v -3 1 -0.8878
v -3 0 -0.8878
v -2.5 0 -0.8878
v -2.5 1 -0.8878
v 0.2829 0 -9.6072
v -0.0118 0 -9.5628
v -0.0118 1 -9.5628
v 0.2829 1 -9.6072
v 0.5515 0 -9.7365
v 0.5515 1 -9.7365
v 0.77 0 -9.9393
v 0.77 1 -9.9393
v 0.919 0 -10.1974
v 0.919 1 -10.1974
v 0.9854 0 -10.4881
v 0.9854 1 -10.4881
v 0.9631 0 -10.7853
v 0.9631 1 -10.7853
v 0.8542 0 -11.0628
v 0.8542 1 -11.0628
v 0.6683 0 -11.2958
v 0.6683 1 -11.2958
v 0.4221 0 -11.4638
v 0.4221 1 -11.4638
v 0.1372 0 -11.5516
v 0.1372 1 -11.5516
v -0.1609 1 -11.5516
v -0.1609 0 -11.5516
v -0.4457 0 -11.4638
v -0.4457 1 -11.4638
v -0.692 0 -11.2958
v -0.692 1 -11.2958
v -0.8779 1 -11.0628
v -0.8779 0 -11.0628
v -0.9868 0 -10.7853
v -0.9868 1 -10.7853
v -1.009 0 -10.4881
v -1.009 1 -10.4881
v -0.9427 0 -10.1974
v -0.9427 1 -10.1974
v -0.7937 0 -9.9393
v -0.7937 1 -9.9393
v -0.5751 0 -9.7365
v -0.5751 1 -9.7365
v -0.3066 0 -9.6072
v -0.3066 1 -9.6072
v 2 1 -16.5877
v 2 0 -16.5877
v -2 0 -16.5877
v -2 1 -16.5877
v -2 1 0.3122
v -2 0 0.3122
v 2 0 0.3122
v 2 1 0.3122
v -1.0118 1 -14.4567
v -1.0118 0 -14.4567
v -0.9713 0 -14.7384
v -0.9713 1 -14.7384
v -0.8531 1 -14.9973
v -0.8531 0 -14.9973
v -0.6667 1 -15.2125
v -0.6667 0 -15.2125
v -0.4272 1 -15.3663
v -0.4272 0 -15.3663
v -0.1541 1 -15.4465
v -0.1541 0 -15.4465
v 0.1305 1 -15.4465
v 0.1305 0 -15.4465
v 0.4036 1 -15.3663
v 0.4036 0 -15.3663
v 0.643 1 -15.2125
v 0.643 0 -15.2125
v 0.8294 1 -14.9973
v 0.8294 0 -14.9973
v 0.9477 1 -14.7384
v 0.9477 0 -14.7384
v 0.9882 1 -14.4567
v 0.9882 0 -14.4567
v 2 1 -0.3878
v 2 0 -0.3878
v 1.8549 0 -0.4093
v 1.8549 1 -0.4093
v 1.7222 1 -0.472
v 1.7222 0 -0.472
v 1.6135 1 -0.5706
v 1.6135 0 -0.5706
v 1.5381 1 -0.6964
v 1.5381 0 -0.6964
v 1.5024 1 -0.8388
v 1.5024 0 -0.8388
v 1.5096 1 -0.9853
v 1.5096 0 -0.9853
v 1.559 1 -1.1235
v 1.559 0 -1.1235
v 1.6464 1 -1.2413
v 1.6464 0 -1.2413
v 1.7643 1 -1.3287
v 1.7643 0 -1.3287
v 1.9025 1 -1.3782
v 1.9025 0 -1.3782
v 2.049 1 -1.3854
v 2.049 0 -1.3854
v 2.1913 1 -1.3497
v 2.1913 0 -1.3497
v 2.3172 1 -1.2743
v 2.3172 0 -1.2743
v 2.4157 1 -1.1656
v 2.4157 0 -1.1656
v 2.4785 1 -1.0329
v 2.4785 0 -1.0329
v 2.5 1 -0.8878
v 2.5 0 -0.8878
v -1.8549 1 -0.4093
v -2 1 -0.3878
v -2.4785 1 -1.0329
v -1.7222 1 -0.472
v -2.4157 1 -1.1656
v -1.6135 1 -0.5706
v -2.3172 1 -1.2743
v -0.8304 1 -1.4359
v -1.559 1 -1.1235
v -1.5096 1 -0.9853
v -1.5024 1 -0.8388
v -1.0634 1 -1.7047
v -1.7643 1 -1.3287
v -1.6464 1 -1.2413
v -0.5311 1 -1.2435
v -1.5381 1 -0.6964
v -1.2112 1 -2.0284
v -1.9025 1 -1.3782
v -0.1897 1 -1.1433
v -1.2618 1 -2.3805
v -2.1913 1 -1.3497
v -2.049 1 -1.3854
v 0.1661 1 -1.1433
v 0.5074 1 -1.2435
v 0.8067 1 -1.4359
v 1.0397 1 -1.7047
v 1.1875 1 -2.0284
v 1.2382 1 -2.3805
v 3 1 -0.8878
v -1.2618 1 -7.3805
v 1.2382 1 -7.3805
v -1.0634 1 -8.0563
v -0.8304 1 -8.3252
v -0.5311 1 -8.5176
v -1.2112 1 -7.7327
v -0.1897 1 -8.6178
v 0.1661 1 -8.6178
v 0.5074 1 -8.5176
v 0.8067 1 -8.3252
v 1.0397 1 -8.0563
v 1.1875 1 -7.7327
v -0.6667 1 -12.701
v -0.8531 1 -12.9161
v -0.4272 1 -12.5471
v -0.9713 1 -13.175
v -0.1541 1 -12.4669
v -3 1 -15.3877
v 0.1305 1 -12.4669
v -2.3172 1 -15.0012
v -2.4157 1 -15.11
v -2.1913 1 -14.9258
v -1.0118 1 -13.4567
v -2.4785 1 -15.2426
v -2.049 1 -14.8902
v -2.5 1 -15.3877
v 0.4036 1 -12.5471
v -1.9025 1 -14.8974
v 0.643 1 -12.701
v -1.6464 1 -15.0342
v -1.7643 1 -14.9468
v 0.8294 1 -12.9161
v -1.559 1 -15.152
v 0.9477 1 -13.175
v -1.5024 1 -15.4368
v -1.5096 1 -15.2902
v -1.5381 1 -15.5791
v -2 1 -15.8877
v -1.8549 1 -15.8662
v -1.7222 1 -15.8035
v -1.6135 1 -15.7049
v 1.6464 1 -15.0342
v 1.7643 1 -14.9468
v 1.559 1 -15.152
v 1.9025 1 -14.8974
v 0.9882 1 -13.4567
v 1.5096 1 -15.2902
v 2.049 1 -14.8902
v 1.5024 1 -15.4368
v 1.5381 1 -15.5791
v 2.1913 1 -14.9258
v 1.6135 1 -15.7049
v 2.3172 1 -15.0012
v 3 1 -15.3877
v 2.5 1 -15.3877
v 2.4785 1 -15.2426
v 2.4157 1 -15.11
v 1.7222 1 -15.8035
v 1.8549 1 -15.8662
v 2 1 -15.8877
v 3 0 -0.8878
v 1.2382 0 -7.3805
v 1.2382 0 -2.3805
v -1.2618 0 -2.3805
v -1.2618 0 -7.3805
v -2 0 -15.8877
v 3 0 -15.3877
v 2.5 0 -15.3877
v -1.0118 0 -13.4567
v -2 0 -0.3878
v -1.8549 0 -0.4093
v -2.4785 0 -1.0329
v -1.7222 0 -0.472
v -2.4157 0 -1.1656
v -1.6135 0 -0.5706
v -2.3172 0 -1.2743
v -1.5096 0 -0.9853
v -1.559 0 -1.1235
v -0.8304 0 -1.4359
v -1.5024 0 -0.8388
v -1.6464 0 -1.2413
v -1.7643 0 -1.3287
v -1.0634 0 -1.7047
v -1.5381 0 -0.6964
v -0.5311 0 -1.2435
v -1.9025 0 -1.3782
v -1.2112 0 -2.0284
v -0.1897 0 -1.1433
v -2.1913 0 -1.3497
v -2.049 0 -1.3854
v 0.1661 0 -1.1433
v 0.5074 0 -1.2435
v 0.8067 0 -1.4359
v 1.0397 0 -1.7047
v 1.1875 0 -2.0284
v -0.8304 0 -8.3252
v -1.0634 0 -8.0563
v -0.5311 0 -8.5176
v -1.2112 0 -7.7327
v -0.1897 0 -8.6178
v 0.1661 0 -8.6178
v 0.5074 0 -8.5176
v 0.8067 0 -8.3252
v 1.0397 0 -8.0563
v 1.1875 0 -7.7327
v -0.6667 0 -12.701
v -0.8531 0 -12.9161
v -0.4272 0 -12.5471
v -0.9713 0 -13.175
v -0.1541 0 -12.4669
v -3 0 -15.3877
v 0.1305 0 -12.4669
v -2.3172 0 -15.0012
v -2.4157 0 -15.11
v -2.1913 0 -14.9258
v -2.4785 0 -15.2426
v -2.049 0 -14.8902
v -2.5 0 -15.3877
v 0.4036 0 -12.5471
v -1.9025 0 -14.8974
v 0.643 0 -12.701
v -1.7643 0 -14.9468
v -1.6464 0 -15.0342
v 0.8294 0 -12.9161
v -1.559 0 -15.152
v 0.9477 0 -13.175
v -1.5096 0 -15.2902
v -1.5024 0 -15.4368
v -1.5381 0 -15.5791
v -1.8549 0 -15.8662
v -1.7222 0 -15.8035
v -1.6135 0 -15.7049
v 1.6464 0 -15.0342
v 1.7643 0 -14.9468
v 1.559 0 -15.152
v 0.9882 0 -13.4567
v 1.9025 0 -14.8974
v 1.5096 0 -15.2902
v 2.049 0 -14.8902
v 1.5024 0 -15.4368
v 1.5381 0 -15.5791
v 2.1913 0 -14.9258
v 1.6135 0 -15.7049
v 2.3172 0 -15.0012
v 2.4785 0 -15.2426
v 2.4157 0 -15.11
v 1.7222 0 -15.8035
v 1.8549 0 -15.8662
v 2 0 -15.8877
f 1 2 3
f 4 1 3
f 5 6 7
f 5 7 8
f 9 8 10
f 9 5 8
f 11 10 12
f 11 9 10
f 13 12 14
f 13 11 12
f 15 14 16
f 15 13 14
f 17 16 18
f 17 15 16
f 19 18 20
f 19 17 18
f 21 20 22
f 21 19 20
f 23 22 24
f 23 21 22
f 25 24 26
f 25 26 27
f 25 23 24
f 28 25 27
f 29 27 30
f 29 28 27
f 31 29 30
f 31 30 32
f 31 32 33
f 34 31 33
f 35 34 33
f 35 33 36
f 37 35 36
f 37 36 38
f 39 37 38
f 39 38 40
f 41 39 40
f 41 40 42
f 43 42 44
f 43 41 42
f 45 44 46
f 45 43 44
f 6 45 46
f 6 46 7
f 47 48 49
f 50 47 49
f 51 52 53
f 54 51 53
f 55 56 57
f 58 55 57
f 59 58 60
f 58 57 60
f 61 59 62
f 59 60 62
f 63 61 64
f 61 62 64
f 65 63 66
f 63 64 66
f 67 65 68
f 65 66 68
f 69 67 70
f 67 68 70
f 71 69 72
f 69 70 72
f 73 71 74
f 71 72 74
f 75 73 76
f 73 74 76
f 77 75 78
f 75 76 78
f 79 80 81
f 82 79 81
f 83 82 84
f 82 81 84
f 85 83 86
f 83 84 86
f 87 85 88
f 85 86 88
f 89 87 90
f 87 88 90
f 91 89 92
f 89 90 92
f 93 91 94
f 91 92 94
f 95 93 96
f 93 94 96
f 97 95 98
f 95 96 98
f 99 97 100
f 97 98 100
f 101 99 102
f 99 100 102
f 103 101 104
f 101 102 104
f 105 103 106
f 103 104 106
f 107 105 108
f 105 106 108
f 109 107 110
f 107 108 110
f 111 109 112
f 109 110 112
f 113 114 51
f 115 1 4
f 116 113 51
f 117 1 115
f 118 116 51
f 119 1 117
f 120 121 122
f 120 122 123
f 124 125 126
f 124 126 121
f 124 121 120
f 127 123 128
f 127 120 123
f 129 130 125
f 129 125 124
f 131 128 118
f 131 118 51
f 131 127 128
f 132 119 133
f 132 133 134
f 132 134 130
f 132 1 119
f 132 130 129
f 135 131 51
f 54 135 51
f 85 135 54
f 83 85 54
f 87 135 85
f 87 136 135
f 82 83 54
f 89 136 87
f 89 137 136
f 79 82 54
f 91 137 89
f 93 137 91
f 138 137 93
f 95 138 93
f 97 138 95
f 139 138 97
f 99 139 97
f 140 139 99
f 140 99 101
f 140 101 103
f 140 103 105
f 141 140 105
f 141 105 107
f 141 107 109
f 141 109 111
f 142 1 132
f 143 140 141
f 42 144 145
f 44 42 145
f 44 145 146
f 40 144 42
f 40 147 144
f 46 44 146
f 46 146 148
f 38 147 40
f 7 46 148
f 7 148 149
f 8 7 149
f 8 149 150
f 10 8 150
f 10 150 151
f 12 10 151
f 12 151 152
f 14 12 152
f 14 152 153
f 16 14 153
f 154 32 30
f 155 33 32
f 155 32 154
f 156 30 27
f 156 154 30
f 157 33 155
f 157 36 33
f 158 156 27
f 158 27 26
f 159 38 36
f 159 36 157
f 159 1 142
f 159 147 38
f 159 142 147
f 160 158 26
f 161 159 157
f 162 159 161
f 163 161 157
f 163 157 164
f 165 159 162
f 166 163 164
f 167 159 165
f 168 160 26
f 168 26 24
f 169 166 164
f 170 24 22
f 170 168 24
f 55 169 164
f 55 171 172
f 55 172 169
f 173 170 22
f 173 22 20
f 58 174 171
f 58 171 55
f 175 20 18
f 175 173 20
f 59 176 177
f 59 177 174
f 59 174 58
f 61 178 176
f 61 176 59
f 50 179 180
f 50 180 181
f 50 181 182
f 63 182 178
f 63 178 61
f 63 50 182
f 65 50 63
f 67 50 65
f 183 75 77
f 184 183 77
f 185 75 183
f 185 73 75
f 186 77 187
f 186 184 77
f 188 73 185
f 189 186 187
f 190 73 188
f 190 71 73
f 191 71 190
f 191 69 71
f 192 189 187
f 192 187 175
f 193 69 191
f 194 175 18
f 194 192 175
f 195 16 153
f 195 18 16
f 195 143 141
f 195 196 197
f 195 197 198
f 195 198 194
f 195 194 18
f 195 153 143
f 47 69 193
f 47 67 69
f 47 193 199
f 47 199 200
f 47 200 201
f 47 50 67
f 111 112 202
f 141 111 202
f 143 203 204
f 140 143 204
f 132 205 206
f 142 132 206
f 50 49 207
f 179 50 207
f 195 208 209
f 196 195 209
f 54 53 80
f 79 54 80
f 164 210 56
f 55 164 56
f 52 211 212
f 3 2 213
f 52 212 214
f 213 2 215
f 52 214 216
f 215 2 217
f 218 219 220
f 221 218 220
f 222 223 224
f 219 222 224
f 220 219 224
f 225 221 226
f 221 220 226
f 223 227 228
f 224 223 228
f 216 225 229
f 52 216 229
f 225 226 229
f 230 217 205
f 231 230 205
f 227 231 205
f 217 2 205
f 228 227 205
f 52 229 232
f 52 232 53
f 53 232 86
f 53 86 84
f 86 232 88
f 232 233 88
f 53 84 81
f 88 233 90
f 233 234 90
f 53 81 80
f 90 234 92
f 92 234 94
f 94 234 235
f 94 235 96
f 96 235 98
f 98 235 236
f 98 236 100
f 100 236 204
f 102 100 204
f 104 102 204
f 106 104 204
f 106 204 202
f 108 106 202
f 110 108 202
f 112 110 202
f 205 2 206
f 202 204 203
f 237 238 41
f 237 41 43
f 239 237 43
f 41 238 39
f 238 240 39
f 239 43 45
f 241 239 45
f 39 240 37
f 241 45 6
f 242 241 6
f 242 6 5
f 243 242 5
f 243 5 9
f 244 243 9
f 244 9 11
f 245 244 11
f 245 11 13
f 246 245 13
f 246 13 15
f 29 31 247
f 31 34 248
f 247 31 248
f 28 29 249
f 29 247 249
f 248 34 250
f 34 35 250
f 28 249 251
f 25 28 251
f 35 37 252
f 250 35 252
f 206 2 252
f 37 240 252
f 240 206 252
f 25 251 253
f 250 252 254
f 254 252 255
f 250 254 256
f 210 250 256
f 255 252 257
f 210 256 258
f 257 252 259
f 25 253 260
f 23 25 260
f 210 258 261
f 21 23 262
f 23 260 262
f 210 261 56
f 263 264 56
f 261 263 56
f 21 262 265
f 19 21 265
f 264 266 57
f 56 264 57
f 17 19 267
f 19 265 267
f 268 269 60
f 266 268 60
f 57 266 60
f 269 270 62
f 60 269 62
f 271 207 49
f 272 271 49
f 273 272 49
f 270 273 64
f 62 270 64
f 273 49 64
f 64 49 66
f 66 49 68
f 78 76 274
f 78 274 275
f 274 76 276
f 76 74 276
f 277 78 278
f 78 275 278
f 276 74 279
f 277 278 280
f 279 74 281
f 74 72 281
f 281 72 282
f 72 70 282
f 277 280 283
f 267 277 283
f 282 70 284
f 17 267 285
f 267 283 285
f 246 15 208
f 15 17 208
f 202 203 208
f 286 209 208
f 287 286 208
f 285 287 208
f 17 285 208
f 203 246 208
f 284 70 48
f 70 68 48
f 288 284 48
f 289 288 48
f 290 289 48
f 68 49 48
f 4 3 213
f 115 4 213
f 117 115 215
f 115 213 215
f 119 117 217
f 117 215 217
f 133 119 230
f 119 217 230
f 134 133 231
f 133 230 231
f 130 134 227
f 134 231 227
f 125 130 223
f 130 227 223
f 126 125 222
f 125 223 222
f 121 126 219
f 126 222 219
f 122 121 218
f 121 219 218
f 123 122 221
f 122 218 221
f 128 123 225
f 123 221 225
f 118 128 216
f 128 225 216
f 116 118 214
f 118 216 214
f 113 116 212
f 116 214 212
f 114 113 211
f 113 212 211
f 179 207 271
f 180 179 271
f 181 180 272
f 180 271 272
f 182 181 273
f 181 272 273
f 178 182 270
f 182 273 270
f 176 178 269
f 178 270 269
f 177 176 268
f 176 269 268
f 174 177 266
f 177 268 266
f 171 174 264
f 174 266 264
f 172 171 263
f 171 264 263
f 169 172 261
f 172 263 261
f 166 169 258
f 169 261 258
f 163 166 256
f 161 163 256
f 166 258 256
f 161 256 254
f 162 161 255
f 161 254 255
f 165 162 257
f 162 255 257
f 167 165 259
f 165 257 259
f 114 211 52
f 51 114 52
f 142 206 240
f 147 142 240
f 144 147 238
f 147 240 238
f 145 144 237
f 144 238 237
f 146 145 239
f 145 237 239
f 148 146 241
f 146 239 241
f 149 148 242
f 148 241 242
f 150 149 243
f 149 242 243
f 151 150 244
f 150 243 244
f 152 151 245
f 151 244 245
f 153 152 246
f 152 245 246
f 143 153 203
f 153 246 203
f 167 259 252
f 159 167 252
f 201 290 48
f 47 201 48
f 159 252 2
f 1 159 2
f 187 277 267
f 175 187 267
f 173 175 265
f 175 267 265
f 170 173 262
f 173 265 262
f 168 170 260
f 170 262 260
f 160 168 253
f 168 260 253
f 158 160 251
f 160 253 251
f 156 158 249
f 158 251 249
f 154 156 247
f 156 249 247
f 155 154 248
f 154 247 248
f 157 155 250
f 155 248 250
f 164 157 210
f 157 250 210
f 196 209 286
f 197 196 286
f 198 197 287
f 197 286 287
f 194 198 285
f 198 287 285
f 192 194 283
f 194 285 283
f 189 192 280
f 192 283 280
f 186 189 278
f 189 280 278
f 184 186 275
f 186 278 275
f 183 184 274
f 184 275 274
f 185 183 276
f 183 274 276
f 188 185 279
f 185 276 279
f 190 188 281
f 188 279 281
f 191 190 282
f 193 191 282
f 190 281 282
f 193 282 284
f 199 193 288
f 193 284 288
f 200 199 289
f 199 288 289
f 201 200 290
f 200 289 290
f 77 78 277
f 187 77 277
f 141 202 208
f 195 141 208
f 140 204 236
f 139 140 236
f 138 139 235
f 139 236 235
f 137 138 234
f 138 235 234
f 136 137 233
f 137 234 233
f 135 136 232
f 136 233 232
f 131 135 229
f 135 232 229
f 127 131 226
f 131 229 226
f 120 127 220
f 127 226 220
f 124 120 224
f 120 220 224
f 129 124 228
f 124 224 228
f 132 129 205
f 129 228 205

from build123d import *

# Parameters (mm, degrees)
SKETCH_1_R      = 1
EXTRUDE_1_DEPTH = 1


with BuildPart() as part:
    # 草图1 → 凸台-拉伸1 (new body)
    with BuildSketch(Plane(origin=(0, 0, 0), x_dir=(1, 0, 0), z_dir=(0, 1, 0))):
        with BuildLine():
            Line((-2, 16.38774479), (-2, 15.88774479))
            ThreePointArc((-2, 15.88774479), (-1.646446609, 15.034191399), (-2.5, 15.38774479))
            Line((-2.5, 15.38774479), (-3, 15.38774479))
            Line((-3, 15.38774479), (-3, 14.38774479))
            Line((-3, 14.38774479), (-3, 3.38774479))
            Line((-3, 3.38774479), (-3, 2.087766192))
            Line((-3, 2.087766192), (-3, 0.887766192))
            Line((-3, 0.887766192), (-2.5, 0.887766192))
            ThreePointArc((-2.5, 0.887766192), (-1.646446609, 1.241319582), (-2, 0.387766192))
            Line((-2, 0.387766192), (-2, -0.312233808))
            Line((-2, -0.312233808), (2, -0.312233808))
            Line((2, -0.312233808), (2, 0.387766192))
            ThreePointArc((2, 0.387766192), (1.646446609, 1.241319582), (2.5, 0.887766192))
            Line((2.5, 0.887766192), (3, 0.887766192))
            Line((3, 0.887766192), (3, 2.087766192))
            Line((3, 2.087766192), (3, 3.38774479))
            Line((3, 3.38774479), (3, 14.38774479))
            Line((3, 14.38774479), (3, 15.38774479))
            Line((3, 15.38774479), (2.5, 15.38774479))
            ThreePointArc((2.5, 15.38774479), (1.646446609, 15.034191399), (2, 15.88774479))
            Line((2, 15.88774479), (2, 16.58774479))
            Line((2, 16.58774479), (-2, 16.58774479))
            Line((-2, 16.58774479), (-2, 16.38774479))
        make_face()
        with BuildLine():
            ThreePointArc((1.238170819, 2.380547047), (-0.011829181, 1.130547047), (-1.261829181, 2.380547047))
            Line((-1.261829181, 2.380547047), (-1.261829181, 7.380547047))
            ThreePointArc((-1.261829181, 7.380547047), (-0.011829181, 8.630547047), (1.238170819, 7.380547047))
            Line((1.238170819, 7.380547047), (1.238170819, 2.380547047))
        make_face(mode=Mode.SUBTRACT)
        with Locations(Location((-0.011829181, 10.562782389, 0), (0, 0, 270))):
            Circle(SKETCH_1_R, mode=Mode.SUBTRACT)
        with BuildLine():
            ThreePointArc((0.988170819, 13.456705927), (-0.011829181, 12.456705927), (-1.011829181, 13.456705927))
            Line((-1.011829181, 13.456705927), (-1.011829181, 14.456705927))
            ThreePointArc((-1.011829181, 14.456705927), (-0.011829181, 15.456705927), (0.988170819, 14.456705927))
            Line((0.988170819, 14.456705927), (0.988170819, 13.456705927))
        make_face(mode=Mode.SUBTRACT)
    extrude(amount=EXTRUDE_1_DEPTH)


solid = part.part
